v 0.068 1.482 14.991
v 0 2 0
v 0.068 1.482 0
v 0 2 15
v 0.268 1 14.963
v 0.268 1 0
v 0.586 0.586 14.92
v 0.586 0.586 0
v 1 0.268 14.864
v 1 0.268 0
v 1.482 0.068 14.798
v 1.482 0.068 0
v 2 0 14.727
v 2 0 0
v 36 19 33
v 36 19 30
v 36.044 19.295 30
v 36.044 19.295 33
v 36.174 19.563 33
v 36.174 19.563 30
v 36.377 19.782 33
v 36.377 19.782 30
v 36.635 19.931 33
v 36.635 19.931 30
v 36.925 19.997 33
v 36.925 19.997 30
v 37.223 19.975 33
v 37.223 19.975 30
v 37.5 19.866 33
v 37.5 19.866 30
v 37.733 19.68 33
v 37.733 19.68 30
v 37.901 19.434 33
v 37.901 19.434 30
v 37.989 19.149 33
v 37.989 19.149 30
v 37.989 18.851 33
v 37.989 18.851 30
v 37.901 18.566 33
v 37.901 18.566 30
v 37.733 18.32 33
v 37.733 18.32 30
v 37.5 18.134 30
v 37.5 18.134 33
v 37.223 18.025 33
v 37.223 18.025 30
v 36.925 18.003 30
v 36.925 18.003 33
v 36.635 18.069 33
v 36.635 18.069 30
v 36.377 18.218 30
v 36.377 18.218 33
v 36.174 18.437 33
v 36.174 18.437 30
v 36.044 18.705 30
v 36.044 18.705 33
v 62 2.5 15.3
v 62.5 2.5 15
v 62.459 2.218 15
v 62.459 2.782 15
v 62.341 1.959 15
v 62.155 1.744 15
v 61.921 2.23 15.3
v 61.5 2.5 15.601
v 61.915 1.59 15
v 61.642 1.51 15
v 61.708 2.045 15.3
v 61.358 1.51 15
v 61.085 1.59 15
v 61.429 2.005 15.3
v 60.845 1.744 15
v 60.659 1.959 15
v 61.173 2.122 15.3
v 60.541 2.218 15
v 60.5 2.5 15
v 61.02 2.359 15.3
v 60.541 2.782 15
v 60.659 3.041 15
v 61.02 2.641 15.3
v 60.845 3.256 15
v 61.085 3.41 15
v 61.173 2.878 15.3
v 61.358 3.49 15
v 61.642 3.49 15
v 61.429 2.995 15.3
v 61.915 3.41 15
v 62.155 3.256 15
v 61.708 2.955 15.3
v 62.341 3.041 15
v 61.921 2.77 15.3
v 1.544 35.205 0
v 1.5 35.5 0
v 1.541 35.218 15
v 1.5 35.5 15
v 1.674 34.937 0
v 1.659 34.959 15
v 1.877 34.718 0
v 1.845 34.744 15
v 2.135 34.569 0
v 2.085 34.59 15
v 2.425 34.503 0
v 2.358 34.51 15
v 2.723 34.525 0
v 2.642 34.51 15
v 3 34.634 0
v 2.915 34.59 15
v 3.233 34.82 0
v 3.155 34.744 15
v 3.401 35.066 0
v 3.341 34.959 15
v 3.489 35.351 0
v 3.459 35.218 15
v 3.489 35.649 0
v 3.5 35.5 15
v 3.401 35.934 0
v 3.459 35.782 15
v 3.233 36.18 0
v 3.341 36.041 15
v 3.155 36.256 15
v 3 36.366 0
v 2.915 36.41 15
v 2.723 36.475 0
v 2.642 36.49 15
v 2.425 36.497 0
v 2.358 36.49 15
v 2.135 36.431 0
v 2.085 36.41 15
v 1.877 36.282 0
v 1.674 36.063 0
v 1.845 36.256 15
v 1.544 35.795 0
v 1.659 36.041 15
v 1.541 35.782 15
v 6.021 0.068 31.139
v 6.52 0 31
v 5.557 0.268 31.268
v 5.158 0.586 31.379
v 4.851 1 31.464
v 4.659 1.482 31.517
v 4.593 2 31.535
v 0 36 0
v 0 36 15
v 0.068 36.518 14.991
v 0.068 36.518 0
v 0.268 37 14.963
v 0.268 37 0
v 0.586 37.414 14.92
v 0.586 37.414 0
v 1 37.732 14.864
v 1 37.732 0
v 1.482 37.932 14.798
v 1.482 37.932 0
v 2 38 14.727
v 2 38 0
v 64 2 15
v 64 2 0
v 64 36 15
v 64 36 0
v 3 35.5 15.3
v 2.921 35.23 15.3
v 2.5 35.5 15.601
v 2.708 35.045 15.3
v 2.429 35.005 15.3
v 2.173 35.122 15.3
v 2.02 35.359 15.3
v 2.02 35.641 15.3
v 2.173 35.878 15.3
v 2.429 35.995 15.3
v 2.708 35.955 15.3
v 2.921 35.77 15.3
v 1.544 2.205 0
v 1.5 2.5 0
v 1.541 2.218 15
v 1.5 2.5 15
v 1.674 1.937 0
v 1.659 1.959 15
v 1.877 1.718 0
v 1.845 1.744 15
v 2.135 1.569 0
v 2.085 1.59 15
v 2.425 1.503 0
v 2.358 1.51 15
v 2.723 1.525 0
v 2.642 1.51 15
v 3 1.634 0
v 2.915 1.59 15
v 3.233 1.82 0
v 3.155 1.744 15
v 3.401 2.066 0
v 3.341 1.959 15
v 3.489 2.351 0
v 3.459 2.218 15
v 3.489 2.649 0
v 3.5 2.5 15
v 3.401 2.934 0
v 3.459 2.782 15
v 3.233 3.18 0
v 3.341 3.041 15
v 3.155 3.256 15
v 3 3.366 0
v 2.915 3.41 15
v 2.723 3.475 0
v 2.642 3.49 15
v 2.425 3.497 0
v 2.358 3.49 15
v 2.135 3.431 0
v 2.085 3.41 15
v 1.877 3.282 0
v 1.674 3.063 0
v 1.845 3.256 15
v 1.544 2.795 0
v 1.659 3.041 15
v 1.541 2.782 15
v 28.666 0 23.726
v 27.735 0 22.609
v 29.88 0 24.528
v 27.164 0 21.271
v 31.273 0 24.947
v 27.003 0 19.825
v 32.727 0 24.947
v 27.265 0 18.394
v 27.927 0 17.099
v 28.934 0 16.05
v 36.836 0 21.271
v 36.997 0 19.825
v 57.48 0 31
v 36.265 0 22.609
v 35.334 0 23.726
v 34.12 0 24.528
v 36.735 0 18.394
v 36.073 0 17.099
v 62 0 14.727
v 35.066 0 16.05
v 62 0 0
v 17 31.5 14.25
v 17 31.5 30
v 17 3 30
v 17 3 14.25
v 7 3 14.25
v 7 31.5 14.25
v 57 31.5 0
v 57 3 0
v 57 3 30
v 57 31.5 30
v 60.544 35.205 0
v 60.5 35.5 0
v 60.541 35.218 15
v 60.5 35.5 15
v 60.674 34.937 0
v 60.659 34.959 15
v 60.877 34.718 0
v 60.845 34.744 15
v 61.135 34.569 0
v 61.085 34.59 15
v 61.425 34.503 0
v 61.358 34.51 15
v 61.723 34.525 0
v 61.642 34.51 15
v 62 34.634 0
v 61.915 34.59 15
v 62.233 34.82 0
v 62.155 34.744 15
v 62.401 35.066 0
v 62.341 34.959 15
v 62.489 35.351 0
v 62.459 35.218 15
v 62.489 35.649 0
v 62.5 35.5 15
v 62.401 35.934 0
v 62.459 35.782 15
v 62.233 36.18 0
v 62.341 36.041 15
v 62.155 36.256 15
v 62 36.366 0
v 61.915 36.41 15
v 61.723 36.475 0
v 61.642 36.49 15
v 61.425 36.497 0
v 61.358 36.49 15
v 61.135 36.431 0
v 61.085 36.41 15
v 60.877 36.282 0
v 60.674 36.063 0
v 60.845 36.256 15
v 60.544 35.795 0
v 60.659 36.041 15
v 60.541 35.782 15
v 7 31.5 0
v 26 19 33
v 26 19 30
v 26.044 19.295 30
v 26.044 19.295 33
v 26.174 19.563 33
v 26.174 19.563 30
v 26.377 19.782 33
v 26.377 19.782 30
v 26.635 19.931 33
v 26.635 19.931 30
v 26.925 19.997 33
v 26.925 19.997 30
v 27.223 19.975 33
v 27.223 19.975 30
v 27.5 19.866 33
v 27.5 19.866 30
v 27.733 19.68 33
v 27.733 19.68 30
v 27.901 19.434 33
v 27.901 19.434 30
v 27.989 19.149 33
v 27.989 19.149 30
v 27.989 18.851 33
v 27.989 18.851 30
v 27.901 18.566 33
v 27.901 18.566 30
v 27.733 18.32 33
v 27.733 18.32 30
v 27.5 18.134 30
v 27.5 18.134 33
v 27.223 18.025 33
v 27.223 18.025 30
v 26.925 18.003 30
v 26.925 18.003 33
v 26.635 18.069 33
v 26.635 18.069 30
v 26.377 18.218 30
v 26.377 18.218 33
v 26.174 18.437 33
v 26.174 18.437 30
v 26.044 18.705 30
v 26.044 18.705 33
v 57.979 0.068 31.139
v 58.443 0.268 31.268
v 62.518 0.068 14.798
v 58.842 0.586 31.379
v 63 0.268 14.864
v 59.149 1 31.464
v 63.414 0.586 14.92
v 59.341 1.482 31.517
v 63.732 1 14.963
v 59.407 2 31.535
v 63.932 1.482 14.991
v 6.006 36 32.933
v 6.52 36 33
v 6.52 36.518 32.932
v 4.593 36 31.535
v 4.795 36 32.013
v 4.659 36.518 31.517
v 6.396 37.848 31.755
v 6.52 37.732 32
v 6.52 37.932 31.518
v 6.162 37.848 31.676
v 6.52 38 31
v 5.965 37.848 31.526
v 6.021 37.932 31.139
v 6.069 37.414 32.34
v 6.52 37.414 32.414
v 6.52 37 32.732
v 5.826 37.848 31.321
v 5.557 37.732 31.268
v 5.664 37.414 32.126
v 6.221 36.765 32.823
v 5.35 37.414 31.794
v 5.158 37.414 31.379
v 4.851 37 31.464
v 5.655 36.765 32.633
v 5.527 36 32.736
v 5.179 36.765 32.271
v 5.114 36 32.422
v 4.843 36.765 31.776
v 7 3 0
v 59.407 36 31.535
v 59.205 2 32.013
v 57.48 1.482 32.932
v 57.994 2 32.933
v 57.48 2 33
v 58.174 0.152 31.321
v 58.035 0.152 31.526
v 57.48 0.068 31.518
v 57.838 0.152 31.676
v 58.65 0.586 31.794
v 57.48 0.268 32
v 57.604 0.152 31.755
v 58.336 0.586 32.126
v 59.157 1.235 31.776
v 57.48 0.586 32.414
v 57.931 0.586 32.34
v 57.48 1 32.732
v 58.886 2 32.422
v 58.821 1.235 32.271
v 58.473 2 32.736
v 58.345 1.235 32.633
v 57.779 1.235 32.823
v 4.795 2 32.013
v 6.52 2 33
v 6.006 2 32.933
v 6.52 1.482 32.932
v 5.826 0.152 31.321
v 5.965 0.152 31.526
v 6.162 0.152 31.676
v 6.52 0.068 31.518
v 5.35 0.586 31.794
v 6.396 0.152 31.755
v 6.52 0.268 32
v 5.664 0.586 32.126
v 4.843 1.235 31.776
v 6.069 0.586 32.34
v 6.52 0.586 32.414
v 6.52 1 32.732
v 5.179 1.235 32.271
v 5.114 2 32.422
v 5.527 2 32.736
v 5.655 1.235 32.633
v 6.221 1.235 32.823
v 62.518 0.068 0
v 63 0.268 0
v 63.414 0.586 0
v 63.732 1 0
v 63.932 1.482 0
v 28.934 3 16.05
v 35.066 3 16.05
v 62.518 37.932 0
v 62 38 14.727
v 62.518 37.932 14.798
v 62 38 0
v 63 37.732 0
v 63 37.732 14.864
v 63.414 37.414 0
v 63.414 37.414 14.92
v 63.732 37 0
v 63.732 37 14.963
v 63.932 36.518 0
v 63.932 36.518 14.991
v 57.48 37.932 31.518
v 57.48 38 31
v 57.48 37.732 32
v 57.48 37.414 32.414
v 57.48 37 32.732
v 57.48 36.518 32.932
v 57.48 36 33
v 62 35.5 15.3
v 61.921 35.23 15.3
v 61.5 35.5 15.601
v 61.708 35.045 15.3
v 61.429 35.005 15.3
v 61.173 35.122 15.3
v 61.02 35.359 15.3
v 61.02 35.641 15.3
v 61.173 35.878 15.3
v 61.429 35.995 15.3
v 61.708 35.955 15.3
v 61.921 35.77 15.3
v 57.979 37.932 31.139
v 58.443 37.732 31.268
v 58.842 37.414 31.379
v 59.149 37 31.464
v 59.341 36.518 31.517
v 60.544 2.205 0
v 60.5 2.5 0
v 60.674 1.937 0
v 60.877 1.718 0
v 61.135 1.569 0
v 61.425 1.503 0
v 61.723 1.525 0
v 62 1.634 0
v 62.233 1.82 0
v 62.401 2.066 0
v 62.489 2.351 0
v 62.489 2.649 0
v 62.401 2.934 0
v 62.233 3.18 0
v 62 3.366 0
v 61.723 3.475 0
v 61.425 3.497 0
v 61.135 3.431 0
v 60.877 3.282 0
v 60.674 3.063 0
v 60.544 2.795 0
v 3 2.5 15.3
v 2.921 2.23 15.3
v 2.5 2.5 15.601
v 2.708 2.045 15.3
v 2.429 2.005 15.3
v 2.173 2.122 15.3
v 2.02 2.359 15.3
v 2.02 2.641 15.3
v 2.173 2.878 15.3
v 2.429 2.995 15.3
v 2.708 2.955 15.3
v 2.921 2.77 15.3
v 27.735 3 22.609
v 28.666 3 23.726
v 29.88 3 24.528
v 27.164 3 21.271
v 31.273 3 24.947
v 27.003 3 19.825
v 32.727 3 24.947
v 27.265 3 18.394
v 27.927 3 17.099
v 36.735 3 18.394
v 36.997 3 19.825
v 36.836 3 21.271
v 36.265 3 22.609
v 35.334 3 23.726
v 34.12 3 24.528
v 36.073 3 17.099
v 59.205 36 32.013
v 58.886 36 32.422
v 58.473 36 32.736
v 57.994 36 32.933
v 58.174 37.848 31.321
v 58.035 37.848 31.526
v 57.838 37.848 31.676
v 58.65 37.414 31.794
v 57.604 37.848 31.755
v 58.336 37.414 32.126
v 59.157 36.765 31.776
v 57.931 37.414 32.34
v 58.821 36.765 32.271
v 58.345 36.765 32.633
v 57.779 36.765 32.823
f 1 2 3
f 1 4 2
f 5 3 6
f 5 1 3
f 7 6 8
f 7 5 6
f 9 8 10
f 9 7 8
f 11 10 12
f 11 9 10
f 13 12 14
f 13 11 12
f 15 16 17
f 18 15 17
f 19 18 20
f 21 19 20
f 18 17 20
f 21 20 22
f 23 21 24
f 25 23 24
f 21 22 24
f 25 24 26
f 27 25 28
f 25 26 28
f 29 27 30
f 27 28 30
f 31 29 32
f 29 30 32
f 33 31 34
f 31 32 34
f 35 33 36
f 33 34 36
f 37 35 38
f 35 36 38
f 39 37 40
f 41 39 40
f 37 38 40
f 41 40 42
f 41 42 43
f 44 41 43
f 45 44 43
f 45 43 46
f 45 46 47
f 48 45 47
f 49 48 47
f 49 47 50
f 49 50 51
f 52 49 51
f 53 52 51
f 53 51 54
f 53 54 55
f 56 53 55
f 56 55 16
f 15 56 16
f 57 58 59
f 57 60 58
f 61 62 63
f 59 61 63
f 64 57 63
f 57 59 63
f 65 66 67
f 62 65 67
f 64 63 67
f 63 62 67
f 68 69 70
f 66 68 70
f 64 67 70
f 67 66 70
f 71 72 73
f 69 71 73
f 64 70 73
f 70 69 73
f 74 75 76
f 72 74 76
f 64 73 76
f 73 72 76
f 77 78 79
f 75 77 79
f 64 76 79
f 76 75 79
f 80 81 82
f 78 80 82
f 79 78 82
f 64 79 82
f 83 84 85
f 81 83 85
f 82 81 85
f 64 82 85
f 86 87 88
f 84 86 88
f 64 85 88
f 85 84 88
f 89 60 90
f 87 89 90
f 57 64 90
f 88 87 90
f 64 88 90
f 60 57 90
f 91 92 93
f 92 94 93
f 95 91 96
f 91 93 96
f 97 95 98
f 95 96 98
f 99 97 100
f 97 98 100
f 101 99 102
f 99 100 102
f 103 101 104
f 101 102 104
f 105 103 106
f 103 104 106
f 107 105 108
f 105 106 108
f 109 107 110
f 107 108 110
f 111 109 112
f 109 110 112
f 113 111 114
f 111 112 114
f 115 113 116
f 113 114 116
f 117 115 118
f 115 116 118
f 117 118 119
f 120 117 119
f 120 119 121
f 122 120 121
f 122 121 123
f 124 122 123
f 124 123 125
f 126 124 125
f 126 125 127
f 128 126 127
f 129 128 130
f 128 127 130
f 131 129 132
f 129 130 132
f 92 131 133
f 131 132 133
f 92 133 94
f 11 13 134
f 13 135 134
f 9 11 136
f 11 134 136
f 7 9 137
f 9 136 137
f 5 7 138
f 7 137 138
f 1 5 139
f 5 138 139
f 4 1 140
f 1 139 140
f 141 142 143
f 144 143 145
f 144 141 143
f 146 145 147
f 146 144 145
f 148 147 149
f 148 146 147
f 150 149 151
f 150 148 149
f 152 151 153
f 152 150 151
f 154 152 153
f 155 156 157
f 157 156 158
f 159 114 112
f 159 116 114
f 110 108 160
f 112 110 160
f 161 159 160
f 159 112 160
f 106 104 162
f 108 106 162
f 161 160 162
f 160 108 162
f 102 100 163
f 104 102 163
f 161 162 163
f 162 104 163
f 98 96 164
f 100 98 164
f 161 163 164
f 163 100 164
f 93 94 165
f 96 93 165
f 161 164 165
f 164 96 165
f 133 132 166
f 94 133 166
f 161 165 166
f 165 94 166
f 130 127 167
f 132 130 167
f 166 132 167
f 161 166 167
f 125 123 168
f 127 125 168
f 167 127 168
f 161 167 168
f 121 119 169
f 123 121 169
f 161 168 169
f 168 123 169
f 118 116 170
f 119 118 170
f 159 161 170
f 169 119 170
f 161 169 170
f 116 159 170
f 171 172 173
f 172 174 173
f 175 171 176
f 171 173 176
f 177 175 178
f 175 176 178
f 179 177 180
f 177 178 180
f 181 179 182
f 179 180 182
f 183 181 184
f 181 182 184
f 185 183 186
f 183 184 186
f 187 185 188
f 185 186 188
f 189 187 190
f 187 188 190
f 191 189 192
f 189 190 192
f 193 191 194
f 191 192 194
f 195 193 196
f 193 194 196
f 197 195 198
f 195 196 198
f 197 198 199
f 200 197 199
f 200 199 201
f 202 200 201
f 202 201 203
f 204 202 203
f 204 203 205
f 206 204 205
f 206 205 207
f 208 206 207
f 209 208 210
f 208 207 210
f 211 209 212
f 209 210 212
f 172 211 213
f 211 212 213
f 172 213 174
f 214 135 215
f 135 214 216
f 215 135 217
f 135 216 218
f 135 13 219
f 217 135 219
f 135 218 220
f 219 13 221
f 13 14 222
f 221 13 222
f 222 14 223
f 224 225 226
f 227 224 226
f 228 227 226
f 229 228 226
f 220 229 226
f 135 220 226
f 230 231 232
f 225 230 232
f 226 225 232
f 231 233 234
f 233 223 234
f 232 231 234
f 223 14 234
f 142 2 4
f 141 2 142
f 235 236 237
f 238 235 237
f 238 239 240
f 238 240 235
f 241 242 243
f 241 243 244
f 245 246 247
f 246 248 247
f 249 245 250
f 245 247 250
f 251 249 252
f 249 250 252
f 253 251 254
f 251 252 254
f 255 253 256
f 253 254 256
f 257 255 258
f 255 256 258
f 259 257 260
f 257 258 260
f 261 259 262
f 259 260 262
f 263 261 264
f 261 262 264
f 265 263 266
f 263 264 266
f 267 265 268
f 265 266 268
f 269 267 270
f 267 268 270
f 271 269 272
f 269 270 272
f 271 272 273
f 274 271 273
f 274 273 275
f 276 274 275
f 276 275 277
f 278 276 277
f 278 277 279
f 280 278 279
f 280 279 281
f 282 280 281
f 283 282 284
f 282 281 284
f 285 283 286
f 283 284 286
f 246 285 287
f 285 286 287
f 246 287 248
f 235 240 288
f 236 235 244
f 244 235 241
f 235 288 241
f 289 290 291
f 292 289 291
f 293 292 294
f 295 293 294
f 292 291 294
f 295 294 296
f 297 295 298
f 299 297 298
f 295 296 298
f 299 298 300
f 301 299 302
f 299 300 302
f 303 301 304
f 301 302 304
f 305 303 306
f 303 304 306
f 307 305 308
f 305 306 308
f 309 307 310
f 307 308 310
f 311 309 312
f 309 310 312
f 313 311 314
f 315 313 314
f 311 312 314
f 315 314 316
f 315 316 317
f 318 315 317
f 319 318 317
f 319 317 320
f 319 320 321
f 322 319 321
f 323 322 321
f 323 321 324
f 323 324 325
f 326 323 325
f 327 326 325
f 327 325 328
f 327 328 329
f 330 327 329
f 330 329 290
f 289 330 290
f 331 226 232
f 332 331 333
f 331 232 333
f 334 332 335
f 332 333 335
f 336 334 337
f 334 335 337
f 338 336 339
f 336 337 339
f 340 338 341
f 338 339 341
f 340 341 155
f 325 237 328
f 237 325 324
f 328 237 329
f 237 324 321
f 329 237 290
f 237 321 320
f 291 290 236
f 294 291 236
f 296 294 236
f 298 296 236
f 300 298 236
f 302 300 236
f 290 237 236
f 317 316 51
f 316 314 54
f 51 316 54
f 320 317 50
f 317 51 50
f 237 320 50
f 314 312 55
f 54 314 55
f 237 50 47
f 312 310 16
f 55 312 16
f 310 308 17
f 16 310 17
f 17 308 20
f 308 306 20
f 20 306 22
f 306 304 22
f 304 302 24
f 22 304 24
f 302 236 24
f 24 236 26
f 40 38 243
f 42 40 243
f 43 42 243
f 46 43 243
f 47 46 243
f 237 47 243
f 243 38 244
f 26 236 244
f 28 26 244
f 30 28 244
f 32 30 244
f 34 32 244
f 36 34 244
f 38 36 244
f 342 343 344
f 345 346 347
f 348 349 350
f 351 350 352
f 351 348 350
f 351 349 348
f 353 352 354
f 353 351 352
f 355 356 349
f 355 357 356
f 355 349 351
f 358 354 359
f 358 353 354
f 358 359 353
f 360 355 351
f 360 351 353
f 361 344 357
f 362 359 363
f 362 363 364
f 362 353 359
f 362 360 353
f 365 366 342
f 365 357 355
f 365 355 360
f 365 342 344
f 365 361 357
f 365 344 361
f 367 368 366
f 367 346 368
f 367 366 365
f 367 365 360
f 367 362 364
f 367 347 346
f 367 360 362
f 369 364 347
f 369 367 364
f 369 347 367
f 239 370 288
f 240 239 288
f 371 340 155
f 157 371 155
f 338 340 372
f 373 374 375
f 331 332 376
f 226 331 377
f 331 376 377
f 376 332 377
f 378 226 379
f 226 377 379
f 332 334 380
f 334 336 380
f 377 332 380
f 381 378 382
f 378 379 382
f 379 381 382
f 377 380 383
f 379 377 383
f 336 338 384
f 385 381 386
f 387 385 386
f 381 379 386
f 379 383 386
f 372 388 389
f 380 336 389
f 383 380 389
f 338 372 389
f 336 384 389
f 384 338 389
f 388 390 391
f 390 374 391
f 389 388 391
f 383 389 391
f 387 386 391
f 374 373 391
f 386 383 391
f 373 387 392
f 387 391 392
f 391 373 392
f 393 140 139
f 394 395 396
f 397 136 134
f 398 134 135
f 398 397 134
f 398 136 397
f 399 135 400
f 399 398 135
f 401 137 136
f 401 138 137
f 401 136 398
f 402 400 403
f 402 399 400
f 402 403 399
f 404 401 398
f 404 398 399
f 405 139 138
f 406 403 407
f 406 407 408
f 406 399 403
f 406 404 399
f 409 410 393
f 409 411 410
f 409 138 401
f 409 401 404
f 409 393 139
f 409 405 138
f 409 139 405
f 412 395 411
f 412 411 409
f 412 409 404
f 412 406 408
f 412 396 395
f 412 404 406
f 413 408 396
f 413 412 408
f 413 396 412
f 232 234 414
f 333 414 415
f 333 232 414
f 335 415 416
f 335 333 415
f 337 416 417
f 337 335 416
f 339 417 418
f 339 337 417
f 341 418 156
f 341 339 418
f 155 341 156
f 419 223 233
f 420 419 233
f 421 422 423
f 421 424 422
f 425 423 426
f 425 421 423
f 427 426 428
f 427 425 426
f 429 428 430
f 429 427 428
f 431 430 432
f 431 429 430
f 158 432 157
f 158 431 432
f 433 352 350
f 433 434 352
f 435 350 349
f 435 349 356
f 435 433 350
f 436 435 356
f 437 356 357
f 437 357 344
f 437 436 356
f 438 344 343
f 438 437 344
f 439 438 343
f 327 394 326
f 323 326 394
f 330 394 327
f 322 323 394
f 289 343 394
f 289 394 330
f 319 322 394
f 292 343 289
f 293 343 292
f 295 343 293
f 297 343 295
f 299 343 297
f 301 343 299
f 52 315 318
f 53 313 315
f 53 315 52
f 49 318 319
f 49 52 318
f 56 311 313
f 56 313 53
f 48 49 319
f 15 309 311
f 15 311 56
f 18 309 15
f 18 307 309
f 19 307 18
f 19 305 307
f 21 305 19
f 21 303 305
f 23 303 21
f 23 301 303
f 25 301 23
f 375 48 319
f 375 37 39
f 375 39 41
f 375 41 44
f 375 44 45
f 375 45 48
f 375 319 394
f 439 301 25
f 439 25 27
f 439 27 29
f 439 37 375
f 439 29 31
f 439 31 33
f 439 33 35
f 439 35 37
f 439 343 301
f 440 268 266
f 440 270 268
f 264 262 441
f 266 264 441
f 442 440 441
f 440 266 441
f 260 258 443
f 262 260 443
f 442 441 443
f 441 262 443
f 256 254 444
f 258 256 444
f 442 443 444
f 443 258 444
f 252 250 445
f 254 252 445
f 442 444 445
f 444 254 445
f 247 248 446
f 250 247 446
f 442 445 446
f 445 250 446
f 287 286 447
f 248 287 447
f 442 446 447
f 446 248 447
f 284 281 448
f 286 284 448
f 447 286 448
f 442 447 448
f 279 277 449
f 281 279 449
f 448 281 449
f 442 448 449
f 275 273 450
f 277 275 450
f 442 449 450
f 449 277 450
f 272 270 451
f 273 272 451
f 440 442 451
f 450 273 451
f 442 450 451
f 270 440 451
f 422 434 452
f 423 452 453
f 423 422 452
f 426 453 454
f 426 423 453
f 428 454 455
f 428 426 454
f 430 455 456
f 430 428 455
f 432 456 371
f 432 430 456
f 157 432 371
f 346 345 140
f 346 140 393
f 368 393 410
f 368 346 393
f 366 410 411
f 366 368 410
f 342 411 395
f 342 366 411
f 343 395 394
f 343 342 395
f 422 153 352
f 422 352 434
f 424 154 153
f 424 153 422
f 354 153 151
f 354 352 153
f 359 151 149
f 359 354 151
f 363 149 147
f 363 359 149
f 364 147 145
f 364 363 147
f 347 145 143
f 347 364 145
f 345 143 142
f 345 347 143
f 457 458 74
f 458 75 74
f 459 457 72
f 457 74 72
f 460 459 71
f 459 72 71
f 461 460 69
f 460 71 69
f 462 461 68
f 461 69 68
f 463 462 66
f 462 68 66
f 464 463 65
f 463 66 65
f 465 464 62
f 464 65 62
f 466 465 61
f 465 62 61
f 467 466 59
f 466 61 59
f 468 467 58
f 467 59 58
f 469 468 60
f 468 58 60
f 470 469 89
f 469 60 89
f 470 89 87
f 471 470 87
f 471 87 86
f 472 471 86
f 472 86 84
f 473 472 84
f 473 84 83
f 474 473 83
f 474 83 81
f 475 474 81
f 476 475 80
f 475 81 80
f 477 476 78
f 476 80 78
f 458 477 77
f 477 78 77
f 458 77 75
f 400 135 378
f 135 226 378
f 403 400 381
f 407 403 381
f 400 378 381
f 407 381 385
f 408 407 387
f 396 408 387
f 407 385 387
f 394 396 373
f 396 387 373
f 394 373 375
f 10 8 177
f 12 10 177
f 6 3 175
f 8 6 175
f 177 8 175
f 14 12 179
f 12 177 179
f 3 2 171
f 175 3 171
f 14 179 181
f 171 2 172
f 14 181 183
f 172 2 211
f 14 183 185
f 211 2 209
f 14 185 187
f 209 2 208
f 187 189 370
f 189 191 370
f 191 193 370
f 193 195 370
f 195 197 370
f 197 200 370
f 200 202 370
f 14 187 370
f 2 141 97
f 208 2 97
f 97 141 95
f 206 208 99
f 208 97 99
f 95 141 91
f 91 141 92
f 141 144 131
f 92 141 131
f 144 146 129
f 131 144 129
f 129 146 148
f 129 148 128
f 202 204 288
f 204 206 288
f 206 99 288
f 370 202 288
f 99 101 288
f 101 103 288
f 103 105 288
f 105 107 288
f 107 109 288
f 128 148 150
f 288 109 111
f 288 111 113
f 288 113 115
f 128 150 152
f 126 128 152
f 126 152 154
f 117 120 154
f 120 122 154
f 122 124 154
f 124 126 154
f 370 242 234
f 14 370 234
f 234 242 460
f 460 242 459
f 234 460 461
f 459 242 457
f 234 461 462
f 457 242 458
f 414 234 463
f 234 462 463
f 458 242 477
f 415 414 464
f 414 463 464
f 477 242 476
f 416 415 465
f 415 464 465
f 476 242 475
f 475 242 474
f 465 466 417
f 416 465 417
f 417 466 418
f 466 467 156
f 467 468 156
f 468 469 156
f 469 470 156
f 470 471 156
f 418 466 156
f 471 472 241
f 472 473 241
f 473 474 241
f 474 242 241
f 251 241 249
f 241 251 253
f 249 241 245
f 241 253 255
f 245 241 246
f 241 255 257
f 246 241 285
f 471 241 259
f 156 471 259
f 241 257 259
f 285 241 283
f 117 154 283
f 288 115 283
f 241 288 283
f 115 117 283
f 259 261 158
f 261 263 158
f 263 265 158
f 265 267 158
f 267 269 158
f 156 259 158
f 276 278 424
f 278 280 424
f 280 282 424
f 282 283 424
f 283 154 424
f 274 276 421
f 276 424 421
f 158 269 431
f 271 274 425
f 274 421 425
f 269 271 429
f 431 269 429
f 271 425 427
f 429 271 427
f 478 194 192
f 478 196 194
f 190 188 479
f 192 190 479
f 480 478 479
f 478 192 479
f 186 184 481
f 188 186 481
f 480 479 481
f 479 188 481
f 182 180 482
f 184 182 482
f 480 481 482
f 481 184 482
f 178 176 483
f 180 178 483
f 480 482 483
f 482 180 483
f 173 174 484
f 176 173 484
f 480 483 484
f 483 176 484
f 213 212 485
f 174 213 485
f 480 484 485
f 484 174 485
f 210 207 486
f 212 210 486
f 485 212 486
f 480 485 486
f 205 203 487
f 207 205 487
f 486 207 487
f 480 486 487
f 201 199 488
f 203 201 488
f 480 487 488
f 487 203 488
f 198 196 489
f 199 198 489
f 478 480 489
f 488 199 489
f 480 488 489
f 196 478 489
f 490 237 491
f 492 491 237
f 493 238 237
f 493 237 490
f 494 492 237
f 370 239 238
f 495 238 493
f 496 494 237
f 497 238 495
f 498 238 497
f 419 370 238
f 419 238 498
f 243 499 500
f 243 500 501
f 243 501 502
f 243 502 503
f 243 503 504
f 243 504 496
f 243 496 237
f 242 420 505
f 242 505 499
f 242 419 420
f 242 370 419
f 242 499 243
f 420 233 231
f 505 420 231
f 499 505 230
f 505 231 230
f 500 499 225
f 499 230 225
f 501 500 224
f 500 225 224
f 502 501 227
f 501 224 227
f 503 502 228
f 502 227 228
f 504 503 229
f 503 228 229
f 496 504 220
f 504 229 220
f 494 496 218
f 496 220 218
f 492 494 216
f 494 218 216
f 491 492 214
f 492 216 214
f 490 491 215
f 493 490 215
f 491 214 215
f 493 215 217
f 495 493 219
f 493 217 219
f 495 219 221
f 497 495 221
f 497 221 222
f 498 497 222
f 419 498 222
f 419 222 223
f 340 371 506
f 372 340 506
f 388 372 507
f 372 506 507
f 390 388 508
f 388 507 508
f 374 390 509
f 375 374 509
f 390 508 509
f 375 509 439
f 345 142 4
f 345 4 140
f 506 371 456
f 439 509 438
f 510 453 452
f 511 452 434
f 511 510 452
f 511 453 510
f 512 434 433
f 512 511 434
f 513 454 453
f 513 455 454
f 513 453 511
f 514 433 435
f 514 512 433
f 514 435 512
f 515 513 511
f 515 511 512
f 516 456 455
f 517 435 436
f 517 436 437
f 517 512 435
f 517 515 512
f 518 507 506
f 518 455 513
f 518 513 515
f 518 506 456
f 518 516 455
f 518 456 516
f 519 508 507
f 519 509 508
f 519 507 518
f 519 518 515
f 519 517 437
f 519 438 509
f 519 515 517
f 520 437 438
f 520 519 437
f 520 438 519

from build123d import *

# Parameters (mm, degrees)
F0_W      = 64
F0_H      = 38
F0_W_2    = 50
F0_H_2    = 28.5
F1_DEPTH  = 30
F3_D      = 2
F3_DEPTH  = 15
F3_TIP    = 0.600860619
F4_W      = 64
F4_H      = 38
F5_DEPTH  = 3
F6_W      = 10
F6_H      = 28.5
F8_DEPTH  = 15.75
F10_DEPTH = 38
F11_R     = 2
F13_DEPTH = 3
F15_D     = 2


with BuildPart() as f1:
    # F0 (on Top) → F1 (new body)
    with BuildSketch(Plane.XY):
        with Locations((32, 19)):
            Rectangle(F0_W, F0_H)
        with Locations((32, 17.25)):
            Rectangle(F0_W_2, F0_H_2, mode=Mode.SUBTRACT)
    extrude(amount=F1_DEPTH)

    # F3
    with Locations(Plane(origin=(0, 0, 0), x_dir=(1, 0, 0), z_dir=(0, 0, -1))):
        with Locations((2.5, -2.5), (61.5, -2.5), (61.5, -35.5), (2.5, -35.5)):
            Hole(F3_D / 2, depth=F3_DEPTH)
            with Locations((0, 0, -(F3_DEPTH + F3_TIP / 2))):  # 118° drill point
                Cone(0, F3_D / 2, F3_TIP, mode=Mode.SUBTRACT)

    # F4 (on face) → F5 (join)
    with BuildSketch(Plane.XY.offset(30)):
        with Locations((32, 19)):
            Rectangle(F4_W, F4_H)
    extrude(amount=F5_DEPTH)

    # F6 (on face) → F8 (join, through all)
    with BuildSketch(Plane(origin=(0, 0, 30), x_dir=(1, 0, 0), z_dir=(0, 0, -1))):
        with Locations((12, -17.25)):
            Rectangle(F6_W, F6_H)
    extrude(amount=F8_DEPTH)

    # F9 (on face) → F10 (cut, through all)
    with BuildSketch(Plane.XZ):
        Polygon((0, 33), (0, 15), (5, 33), align=None)
        Polygon((64, 33), (59, 33), (64, 15), align=None)
    extrude(amount=-F10_DEPTH, mode=Mode.SUBTRACT)

    # F11
    f11_edges = [f1.edges().sort_by_distance(p)[0] for p in [
        (0, 0, 7.5),
        (2.5, 0, 24),
        (61.5, 0, 24),
        (64, 0, 7.5),
        (2.5, 38, 24),
        (0, 38, 7.5),
        (64, 38, 7.5),
        (61.5, 38, 24),
        (32, 0, 33),
        (5, 19, 33),
        (32, 38, 33),
        (59, 19, 33),
    ]]
    fillet(f11_edges, radius=F11_R)

    # F12 (on face) → F13 (cut, through all)
    with BuildSketch(Plane.XZ):
        with BuildLine():
            Line((28.9344657888, 16.05), (35.0655342112, 16.05))
            ThreePointArc((35.0655342112, 16.05), (32, 25), (28.9344657888, 16.05))
        make_face()
    extrude(amount=-F13_DEPTH, mode=Mode.SUBTRACT)

    # F15 (through all)
    with Locations(Plane.XY.offset(33)):
        with Locations((27, 19), (37, 19)):
            Hole(F15_D / 2)


solid = f1.part
